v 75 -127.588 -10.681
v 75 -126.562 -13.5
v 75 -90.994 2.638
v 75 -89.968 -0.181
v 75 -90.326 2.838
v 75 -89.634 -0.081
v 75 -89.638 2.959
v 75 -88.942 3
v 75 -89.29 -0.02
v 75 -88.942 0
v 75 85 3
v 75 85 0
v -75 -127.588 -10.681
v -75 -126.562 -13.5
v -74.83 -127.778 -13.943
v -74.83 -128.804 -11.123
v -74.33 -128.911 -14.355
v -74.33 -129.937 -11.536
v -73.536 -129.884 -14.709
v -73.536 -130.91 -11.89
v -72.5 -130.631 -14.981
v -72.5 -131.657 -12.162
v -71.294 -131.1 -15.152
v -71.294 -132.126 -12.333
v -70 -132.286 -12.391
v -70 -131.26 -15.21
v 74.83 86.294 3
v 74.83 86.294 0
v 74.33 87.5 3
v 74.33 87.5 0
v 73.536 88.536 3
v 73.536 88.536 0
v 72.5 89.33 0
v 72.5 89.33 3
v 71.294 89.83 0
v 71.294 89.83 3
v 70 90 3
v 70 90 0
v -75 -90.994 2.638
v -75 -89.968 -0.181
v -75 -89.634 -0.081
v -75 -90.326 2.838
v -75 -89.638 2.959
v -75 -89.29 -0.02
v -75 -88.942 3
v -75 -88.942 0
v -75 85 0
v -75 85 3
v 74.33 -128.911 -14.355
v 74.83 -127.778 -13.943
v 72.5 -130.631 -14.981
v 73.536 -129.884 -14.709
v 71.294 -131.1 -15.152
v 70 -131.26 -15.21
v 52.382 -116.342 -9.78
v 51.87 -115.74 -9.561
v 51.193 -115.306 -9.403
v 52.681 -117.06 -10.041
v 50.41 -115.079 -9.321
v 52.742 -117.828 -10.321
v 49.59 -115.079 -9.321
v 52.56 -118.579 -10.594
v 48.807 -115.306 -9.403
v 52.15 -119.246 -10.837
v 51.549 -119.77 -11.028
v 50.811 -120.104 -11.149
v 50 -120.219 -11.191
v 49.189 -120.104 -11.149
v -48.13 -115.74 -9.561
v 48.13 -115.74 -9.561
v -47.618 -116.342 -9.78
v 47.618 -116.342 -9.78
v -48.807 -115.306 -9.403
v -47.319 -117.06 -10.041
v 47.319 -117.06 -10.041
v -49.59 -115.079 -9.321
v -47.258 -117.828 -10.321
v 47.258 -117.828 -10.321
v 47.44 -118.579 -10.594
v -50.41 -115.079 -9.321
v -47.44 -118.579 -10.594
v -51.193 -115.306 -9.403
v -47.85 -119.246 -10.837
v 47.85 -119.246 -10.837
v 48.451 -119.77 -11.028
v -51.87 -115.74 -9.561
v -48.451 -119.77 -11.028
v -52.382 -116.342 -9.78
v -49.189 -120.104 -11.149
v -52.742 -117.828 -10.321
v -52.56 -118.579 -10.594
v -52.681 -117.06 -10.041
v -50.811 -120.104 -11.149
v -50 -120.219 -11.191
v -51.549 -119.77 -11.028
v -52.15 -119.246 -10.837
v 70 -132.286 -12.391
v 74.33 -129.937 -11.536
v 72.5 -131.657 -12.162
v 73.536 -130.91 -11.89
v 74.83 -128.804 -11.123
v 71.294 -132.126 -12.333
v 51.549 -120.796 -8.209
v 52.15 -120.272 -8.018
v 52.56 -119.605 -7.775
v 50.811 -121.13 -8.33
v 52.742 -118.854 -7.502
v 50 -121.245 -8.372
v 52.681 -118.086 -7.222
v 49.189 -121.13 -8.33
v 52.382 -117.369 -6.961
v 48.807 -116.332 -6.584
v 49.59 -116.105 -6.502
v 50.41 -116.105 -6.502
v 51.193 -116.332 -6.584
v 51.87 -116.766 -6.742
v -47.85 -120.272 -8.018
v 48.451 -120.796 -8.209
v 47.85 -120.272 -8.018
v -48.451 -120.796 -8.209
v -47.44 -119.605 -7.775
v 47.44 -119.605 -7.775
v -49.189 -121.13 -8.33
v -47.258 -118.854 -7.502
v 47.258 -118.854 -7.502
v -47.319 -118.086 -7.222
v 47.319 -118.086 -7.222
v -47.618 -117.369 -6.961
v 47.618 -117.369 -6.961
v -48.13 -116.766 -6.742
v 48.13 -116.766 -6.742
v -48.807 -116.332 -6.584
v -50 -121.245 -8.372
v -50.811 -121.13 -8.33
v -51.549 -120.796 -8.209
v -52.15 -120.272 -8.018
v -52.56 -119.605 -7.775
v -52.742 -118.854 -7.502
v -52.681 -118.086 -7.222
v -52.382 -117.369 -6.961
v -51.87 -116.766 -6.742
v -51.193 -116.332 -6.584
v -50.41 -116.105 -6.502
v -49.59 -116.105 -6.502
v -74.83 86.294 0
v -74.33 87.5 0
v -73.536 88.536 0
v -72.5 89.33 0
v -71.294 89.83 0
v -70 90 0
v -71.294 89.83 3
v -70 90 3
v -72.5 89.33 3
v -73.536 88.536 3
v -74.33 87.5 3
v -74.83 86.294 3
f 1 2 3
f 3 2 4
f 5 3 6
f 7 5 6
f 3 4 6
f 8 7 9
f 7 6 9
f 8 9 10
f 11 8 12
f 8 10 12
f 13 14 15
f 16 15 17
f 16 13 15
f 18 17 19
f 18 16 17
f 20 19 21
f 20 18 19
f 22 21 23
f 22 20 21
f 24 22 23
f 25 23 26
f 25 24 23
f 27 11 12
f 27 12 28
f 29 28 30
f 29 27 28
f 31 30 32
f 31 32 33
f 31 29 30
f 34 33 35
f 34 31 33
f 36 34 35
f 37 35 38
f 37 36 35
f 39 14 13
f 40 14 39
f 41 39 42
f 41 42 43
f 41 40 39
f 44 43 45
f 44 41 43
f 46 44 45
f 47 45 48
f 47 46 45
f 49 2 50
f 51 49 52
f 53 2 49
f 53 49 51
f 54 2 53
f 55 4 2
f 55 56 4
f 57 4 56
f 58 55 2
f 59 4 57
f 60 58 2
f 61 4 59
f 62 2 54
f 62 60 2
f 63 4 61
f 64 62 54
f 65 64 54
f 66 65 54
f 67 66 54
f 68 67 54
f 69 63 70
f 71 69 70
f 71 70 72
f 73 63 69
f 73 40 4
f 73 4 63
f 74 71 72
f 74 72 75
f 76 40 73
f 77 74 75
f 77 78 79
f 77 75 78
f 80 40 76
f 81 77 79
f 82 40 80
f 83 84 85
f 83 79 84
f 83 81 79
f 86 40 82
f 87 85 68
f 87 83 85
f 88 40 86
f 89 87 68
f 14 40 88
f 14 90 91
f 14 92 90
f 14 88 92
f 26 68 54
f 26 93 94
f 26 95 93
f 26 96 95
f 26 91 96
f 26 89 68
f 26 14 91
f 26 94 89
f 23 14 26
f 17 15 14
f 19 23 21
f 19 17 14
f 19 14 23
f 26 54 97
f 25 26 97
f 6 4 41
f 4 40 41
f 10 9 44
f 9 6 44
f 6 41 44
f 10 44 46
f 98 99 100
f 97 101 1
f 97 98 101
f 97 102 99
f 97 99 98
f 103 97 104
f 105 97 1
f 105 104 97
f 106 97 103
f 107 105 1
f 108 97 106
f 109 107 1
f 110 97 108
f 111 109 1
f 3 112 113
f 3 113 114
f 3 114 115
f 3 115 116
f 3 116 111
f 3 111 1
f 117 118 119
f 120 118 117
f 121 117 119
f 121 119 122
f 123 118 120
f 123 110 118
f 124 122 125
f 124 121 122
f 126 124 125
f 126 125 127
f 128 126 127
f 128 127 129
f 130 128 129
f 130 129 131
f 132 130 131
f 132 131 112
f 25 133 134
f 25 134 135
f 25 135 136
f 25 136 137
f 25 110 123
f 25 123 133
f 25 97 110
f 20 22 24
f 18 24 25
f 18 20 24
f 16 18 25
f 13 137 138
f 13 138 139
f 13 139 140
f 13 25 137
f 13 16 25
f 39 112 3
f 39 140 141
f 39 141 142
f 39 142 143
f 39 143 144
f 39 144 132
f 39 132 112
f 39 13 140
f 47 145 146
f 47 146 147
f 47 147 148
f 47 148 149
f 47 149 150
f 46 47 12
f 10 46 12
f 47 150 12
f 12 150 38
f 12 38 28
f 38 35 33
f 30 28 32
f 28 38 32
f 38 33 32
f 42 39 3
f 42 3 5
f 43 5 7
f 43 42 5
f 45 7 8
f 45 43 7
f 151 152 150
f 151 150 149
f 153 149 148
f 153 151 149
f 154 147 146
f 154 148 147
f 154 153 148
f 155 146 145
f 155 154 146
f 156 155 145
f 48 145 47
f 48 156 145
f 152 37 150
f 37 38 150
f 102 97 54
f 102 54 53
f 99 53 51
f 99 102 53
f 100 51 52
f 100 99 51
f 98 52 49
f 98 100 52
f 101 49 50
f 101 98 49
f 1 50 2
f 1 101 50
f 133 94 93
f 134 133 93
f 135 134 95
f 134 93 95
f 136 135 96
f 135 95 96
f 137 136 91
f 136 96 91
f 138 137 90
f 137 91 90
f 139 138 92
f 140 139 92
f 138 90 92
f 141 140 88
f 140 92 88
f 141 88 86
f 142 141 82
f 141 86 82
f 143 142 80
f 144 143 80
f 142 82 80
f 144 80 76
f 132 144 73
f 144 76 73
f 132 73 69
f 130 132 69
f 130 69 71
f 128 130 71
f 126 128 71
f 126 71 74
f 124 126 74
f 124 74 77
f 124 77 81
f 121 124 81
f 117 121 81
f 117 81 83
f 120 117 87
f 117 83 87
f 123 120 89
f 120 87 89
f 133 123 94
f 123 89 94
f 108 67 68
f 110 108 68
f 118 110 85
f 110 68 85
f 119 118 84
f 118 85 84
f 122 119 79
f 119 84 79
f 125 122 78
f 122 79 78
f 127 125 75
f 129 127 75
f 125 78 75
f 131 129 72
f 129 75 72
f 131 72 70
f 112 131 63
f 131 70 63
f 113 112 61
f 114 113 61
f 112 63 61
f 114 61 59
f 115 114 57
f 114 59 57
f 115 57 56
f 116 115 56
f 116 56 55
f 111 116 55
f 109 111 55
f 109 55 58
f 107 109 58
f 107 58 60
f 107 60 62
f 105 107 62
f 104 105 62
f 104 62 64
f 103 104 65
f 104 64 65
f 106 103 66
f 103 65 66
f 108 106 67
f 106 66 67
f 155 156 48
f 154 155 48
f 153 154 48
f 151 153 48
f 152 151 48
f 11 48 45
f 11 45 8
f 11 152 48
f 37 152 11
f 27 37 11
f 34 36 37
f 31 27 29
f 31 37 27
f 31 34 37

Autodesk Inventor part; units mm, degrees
ref_plane "YZ Plane" through (0, 0, 0) normal (1, 0, 0) x (0, 1, 0)
ref_plane "XZ Plane" through (0, 0, 0) normal (0, 1, 0) x (-1, 0, 0)
ref_plane "XY Plane" through (0, 0, 0) normal (0, 0, 1) x (1, 0, 0)
sketch "Sketch3" plane through (0, 0, 0) normal (0, 0, 1) x (1, 0, 0)
  line L0 (-75, -90) -> (75, -90)
  line L1 (75, -90) -> (75, 90)
  line L2 (75, 90) -> (-75, 90)
  line L3 (-75, 90) -> (-75, -90)
  line L4 (-75, -90) -> (75, 90) construction
  line L5 (75, -90) -> (-75, 90) construction
  point P0 (0, 0)
  dimension "d11" = 150
  dimension "d12" = 180
extrude "Plate3" add sketch "Sketch3" along normal blind 3
sketch "Sketch4" plane through (-75, -88.9739, 0.1809) normal (0, -0.3420201, 0.9396926) x (1, 0, 0)
  line L0 (150, 0) -> (0, 0)
  line L1 (0, 0) -> (0, -45)
  line L2 (0, -45) -> (150, -45)
  line L3 (150, -45) -> (150, 0)
edge flange "Flange2" height 45 angle 20 thickness 3 bend radius 3 thickness toward (0, -0.3420201, 0.9396926) relief tear relief width 3 relief depth 1.5 edges at (0, -90, 0) wall of the first edge with corners at (75, -88.9739, 0.1809) (-75, -88.9739, 0.1809) (-75, -131.2601, -15.21) (75, -131.2601, -15.21)
bend "Bend2"
corner "Corner2"
fillet "Fillet1" radius 5 4 edges at (75, 90, 1.5) (-75, 90, 1.5) (-75, -131.7731, -13.8004) (75, -131.7731, -13.8004)
sketch "Sketch6" plane through (0, 0, 3) normal (0, 0, 1) x (1, 0, 0)
  line L0 (-67.272, 87) -> (67.272, 87) construction
  line L1 (67.272, 87) -> (67.272, -48) construction
  line L2 (67.272, -48) -> (-67.272, -48) construction
  line L3 (-67.272, -48) -> (-67.272, 87) construction
  line L4 (-75, -88.942) -> (75, -88.942) projected
  line L5 (-70, 90) -> (70, 90) projected
  point P0 (0, 0)
  point P1 (0, 87)
  point P2 (0, 90)
  dimension "d50" = 178.942
  dimension "d51" = 140
  dimension "d52" = 135
  dimension "d53" = 3
decal "Decal2"
sketch "Sketch7" plane through (-75, -90.9942, 2.6382) normal (0, -0.3420201, 0.9396926) x (1, 0, 0)
  line L0 (150, 0) -> (150, -38.942) projected
  line L1 (0, -38.942) -> (0, 0) projected
  line L2 (145, -43.942) -> (5, -43.942) projected
  point P0 (75, 84.6042)
  point P1 (25, -29.442)
  point P2 (125, -29.442)
  dimension "d62" = 100
  dimension "d63" = 150
  dimension "d64" = 25
  dimension "d65" = 14.5
hole "Hole1" at (-50, -118.6606, -7.4316) at (50, -118.6606, -7.4316) direction (0, 0.3420201, -0.9396926) diameter 5.5 end through all clearance for "Countersunk Flat Head Screw DIN EN ISO 2009" size "M5" standard "DIN"
equation "\"d71\" = Grubosc"
equation "\"d13\" = Grubosc"
equation "\"d14\" = SzerokośćGięciaPodcięcia"
equation "\"d15\" = GłębokośćGięciaPodcięcia"
equation "\"d16\" = MinimalnaPozostałość"
equation "\"d17\" = PromieńPrzejścia"
equation "\"d20\" = PromieńGięcia"
equation "\"d21\" = RozmiarPodcięciaNarożnika"
equation "\"d22\" = Wielk_odstępu"
equation "\"d23\" = Rozmiar_promienia_Jacobiego"
equation "\"PromieńGięcia\" = Grubosc"
equation "\"SzerokośćGięciaPodcięcia\" = Grubosc"
equation "\"GłębokośćGięciaPodcięcia\" = 0.5 * Grubosc"
equation "\"RozmiarPodcięciaNarożnika\" = 4 * Grubosc"
equation "\"MinimalnaPozostałość\" = 2 * Grubosc"
equation "\"PromieńPrzejścia\" = PromieńGięcia"
equation "\"Rozmiar_promienia_Jacobiego\" = PromieńGięcia"
equation "\"Wielk_odstępu\" = Grubosc"
equation "\"Grubosc\" = 3"
properties part number "fin" material "S235JR(1.0038)"
